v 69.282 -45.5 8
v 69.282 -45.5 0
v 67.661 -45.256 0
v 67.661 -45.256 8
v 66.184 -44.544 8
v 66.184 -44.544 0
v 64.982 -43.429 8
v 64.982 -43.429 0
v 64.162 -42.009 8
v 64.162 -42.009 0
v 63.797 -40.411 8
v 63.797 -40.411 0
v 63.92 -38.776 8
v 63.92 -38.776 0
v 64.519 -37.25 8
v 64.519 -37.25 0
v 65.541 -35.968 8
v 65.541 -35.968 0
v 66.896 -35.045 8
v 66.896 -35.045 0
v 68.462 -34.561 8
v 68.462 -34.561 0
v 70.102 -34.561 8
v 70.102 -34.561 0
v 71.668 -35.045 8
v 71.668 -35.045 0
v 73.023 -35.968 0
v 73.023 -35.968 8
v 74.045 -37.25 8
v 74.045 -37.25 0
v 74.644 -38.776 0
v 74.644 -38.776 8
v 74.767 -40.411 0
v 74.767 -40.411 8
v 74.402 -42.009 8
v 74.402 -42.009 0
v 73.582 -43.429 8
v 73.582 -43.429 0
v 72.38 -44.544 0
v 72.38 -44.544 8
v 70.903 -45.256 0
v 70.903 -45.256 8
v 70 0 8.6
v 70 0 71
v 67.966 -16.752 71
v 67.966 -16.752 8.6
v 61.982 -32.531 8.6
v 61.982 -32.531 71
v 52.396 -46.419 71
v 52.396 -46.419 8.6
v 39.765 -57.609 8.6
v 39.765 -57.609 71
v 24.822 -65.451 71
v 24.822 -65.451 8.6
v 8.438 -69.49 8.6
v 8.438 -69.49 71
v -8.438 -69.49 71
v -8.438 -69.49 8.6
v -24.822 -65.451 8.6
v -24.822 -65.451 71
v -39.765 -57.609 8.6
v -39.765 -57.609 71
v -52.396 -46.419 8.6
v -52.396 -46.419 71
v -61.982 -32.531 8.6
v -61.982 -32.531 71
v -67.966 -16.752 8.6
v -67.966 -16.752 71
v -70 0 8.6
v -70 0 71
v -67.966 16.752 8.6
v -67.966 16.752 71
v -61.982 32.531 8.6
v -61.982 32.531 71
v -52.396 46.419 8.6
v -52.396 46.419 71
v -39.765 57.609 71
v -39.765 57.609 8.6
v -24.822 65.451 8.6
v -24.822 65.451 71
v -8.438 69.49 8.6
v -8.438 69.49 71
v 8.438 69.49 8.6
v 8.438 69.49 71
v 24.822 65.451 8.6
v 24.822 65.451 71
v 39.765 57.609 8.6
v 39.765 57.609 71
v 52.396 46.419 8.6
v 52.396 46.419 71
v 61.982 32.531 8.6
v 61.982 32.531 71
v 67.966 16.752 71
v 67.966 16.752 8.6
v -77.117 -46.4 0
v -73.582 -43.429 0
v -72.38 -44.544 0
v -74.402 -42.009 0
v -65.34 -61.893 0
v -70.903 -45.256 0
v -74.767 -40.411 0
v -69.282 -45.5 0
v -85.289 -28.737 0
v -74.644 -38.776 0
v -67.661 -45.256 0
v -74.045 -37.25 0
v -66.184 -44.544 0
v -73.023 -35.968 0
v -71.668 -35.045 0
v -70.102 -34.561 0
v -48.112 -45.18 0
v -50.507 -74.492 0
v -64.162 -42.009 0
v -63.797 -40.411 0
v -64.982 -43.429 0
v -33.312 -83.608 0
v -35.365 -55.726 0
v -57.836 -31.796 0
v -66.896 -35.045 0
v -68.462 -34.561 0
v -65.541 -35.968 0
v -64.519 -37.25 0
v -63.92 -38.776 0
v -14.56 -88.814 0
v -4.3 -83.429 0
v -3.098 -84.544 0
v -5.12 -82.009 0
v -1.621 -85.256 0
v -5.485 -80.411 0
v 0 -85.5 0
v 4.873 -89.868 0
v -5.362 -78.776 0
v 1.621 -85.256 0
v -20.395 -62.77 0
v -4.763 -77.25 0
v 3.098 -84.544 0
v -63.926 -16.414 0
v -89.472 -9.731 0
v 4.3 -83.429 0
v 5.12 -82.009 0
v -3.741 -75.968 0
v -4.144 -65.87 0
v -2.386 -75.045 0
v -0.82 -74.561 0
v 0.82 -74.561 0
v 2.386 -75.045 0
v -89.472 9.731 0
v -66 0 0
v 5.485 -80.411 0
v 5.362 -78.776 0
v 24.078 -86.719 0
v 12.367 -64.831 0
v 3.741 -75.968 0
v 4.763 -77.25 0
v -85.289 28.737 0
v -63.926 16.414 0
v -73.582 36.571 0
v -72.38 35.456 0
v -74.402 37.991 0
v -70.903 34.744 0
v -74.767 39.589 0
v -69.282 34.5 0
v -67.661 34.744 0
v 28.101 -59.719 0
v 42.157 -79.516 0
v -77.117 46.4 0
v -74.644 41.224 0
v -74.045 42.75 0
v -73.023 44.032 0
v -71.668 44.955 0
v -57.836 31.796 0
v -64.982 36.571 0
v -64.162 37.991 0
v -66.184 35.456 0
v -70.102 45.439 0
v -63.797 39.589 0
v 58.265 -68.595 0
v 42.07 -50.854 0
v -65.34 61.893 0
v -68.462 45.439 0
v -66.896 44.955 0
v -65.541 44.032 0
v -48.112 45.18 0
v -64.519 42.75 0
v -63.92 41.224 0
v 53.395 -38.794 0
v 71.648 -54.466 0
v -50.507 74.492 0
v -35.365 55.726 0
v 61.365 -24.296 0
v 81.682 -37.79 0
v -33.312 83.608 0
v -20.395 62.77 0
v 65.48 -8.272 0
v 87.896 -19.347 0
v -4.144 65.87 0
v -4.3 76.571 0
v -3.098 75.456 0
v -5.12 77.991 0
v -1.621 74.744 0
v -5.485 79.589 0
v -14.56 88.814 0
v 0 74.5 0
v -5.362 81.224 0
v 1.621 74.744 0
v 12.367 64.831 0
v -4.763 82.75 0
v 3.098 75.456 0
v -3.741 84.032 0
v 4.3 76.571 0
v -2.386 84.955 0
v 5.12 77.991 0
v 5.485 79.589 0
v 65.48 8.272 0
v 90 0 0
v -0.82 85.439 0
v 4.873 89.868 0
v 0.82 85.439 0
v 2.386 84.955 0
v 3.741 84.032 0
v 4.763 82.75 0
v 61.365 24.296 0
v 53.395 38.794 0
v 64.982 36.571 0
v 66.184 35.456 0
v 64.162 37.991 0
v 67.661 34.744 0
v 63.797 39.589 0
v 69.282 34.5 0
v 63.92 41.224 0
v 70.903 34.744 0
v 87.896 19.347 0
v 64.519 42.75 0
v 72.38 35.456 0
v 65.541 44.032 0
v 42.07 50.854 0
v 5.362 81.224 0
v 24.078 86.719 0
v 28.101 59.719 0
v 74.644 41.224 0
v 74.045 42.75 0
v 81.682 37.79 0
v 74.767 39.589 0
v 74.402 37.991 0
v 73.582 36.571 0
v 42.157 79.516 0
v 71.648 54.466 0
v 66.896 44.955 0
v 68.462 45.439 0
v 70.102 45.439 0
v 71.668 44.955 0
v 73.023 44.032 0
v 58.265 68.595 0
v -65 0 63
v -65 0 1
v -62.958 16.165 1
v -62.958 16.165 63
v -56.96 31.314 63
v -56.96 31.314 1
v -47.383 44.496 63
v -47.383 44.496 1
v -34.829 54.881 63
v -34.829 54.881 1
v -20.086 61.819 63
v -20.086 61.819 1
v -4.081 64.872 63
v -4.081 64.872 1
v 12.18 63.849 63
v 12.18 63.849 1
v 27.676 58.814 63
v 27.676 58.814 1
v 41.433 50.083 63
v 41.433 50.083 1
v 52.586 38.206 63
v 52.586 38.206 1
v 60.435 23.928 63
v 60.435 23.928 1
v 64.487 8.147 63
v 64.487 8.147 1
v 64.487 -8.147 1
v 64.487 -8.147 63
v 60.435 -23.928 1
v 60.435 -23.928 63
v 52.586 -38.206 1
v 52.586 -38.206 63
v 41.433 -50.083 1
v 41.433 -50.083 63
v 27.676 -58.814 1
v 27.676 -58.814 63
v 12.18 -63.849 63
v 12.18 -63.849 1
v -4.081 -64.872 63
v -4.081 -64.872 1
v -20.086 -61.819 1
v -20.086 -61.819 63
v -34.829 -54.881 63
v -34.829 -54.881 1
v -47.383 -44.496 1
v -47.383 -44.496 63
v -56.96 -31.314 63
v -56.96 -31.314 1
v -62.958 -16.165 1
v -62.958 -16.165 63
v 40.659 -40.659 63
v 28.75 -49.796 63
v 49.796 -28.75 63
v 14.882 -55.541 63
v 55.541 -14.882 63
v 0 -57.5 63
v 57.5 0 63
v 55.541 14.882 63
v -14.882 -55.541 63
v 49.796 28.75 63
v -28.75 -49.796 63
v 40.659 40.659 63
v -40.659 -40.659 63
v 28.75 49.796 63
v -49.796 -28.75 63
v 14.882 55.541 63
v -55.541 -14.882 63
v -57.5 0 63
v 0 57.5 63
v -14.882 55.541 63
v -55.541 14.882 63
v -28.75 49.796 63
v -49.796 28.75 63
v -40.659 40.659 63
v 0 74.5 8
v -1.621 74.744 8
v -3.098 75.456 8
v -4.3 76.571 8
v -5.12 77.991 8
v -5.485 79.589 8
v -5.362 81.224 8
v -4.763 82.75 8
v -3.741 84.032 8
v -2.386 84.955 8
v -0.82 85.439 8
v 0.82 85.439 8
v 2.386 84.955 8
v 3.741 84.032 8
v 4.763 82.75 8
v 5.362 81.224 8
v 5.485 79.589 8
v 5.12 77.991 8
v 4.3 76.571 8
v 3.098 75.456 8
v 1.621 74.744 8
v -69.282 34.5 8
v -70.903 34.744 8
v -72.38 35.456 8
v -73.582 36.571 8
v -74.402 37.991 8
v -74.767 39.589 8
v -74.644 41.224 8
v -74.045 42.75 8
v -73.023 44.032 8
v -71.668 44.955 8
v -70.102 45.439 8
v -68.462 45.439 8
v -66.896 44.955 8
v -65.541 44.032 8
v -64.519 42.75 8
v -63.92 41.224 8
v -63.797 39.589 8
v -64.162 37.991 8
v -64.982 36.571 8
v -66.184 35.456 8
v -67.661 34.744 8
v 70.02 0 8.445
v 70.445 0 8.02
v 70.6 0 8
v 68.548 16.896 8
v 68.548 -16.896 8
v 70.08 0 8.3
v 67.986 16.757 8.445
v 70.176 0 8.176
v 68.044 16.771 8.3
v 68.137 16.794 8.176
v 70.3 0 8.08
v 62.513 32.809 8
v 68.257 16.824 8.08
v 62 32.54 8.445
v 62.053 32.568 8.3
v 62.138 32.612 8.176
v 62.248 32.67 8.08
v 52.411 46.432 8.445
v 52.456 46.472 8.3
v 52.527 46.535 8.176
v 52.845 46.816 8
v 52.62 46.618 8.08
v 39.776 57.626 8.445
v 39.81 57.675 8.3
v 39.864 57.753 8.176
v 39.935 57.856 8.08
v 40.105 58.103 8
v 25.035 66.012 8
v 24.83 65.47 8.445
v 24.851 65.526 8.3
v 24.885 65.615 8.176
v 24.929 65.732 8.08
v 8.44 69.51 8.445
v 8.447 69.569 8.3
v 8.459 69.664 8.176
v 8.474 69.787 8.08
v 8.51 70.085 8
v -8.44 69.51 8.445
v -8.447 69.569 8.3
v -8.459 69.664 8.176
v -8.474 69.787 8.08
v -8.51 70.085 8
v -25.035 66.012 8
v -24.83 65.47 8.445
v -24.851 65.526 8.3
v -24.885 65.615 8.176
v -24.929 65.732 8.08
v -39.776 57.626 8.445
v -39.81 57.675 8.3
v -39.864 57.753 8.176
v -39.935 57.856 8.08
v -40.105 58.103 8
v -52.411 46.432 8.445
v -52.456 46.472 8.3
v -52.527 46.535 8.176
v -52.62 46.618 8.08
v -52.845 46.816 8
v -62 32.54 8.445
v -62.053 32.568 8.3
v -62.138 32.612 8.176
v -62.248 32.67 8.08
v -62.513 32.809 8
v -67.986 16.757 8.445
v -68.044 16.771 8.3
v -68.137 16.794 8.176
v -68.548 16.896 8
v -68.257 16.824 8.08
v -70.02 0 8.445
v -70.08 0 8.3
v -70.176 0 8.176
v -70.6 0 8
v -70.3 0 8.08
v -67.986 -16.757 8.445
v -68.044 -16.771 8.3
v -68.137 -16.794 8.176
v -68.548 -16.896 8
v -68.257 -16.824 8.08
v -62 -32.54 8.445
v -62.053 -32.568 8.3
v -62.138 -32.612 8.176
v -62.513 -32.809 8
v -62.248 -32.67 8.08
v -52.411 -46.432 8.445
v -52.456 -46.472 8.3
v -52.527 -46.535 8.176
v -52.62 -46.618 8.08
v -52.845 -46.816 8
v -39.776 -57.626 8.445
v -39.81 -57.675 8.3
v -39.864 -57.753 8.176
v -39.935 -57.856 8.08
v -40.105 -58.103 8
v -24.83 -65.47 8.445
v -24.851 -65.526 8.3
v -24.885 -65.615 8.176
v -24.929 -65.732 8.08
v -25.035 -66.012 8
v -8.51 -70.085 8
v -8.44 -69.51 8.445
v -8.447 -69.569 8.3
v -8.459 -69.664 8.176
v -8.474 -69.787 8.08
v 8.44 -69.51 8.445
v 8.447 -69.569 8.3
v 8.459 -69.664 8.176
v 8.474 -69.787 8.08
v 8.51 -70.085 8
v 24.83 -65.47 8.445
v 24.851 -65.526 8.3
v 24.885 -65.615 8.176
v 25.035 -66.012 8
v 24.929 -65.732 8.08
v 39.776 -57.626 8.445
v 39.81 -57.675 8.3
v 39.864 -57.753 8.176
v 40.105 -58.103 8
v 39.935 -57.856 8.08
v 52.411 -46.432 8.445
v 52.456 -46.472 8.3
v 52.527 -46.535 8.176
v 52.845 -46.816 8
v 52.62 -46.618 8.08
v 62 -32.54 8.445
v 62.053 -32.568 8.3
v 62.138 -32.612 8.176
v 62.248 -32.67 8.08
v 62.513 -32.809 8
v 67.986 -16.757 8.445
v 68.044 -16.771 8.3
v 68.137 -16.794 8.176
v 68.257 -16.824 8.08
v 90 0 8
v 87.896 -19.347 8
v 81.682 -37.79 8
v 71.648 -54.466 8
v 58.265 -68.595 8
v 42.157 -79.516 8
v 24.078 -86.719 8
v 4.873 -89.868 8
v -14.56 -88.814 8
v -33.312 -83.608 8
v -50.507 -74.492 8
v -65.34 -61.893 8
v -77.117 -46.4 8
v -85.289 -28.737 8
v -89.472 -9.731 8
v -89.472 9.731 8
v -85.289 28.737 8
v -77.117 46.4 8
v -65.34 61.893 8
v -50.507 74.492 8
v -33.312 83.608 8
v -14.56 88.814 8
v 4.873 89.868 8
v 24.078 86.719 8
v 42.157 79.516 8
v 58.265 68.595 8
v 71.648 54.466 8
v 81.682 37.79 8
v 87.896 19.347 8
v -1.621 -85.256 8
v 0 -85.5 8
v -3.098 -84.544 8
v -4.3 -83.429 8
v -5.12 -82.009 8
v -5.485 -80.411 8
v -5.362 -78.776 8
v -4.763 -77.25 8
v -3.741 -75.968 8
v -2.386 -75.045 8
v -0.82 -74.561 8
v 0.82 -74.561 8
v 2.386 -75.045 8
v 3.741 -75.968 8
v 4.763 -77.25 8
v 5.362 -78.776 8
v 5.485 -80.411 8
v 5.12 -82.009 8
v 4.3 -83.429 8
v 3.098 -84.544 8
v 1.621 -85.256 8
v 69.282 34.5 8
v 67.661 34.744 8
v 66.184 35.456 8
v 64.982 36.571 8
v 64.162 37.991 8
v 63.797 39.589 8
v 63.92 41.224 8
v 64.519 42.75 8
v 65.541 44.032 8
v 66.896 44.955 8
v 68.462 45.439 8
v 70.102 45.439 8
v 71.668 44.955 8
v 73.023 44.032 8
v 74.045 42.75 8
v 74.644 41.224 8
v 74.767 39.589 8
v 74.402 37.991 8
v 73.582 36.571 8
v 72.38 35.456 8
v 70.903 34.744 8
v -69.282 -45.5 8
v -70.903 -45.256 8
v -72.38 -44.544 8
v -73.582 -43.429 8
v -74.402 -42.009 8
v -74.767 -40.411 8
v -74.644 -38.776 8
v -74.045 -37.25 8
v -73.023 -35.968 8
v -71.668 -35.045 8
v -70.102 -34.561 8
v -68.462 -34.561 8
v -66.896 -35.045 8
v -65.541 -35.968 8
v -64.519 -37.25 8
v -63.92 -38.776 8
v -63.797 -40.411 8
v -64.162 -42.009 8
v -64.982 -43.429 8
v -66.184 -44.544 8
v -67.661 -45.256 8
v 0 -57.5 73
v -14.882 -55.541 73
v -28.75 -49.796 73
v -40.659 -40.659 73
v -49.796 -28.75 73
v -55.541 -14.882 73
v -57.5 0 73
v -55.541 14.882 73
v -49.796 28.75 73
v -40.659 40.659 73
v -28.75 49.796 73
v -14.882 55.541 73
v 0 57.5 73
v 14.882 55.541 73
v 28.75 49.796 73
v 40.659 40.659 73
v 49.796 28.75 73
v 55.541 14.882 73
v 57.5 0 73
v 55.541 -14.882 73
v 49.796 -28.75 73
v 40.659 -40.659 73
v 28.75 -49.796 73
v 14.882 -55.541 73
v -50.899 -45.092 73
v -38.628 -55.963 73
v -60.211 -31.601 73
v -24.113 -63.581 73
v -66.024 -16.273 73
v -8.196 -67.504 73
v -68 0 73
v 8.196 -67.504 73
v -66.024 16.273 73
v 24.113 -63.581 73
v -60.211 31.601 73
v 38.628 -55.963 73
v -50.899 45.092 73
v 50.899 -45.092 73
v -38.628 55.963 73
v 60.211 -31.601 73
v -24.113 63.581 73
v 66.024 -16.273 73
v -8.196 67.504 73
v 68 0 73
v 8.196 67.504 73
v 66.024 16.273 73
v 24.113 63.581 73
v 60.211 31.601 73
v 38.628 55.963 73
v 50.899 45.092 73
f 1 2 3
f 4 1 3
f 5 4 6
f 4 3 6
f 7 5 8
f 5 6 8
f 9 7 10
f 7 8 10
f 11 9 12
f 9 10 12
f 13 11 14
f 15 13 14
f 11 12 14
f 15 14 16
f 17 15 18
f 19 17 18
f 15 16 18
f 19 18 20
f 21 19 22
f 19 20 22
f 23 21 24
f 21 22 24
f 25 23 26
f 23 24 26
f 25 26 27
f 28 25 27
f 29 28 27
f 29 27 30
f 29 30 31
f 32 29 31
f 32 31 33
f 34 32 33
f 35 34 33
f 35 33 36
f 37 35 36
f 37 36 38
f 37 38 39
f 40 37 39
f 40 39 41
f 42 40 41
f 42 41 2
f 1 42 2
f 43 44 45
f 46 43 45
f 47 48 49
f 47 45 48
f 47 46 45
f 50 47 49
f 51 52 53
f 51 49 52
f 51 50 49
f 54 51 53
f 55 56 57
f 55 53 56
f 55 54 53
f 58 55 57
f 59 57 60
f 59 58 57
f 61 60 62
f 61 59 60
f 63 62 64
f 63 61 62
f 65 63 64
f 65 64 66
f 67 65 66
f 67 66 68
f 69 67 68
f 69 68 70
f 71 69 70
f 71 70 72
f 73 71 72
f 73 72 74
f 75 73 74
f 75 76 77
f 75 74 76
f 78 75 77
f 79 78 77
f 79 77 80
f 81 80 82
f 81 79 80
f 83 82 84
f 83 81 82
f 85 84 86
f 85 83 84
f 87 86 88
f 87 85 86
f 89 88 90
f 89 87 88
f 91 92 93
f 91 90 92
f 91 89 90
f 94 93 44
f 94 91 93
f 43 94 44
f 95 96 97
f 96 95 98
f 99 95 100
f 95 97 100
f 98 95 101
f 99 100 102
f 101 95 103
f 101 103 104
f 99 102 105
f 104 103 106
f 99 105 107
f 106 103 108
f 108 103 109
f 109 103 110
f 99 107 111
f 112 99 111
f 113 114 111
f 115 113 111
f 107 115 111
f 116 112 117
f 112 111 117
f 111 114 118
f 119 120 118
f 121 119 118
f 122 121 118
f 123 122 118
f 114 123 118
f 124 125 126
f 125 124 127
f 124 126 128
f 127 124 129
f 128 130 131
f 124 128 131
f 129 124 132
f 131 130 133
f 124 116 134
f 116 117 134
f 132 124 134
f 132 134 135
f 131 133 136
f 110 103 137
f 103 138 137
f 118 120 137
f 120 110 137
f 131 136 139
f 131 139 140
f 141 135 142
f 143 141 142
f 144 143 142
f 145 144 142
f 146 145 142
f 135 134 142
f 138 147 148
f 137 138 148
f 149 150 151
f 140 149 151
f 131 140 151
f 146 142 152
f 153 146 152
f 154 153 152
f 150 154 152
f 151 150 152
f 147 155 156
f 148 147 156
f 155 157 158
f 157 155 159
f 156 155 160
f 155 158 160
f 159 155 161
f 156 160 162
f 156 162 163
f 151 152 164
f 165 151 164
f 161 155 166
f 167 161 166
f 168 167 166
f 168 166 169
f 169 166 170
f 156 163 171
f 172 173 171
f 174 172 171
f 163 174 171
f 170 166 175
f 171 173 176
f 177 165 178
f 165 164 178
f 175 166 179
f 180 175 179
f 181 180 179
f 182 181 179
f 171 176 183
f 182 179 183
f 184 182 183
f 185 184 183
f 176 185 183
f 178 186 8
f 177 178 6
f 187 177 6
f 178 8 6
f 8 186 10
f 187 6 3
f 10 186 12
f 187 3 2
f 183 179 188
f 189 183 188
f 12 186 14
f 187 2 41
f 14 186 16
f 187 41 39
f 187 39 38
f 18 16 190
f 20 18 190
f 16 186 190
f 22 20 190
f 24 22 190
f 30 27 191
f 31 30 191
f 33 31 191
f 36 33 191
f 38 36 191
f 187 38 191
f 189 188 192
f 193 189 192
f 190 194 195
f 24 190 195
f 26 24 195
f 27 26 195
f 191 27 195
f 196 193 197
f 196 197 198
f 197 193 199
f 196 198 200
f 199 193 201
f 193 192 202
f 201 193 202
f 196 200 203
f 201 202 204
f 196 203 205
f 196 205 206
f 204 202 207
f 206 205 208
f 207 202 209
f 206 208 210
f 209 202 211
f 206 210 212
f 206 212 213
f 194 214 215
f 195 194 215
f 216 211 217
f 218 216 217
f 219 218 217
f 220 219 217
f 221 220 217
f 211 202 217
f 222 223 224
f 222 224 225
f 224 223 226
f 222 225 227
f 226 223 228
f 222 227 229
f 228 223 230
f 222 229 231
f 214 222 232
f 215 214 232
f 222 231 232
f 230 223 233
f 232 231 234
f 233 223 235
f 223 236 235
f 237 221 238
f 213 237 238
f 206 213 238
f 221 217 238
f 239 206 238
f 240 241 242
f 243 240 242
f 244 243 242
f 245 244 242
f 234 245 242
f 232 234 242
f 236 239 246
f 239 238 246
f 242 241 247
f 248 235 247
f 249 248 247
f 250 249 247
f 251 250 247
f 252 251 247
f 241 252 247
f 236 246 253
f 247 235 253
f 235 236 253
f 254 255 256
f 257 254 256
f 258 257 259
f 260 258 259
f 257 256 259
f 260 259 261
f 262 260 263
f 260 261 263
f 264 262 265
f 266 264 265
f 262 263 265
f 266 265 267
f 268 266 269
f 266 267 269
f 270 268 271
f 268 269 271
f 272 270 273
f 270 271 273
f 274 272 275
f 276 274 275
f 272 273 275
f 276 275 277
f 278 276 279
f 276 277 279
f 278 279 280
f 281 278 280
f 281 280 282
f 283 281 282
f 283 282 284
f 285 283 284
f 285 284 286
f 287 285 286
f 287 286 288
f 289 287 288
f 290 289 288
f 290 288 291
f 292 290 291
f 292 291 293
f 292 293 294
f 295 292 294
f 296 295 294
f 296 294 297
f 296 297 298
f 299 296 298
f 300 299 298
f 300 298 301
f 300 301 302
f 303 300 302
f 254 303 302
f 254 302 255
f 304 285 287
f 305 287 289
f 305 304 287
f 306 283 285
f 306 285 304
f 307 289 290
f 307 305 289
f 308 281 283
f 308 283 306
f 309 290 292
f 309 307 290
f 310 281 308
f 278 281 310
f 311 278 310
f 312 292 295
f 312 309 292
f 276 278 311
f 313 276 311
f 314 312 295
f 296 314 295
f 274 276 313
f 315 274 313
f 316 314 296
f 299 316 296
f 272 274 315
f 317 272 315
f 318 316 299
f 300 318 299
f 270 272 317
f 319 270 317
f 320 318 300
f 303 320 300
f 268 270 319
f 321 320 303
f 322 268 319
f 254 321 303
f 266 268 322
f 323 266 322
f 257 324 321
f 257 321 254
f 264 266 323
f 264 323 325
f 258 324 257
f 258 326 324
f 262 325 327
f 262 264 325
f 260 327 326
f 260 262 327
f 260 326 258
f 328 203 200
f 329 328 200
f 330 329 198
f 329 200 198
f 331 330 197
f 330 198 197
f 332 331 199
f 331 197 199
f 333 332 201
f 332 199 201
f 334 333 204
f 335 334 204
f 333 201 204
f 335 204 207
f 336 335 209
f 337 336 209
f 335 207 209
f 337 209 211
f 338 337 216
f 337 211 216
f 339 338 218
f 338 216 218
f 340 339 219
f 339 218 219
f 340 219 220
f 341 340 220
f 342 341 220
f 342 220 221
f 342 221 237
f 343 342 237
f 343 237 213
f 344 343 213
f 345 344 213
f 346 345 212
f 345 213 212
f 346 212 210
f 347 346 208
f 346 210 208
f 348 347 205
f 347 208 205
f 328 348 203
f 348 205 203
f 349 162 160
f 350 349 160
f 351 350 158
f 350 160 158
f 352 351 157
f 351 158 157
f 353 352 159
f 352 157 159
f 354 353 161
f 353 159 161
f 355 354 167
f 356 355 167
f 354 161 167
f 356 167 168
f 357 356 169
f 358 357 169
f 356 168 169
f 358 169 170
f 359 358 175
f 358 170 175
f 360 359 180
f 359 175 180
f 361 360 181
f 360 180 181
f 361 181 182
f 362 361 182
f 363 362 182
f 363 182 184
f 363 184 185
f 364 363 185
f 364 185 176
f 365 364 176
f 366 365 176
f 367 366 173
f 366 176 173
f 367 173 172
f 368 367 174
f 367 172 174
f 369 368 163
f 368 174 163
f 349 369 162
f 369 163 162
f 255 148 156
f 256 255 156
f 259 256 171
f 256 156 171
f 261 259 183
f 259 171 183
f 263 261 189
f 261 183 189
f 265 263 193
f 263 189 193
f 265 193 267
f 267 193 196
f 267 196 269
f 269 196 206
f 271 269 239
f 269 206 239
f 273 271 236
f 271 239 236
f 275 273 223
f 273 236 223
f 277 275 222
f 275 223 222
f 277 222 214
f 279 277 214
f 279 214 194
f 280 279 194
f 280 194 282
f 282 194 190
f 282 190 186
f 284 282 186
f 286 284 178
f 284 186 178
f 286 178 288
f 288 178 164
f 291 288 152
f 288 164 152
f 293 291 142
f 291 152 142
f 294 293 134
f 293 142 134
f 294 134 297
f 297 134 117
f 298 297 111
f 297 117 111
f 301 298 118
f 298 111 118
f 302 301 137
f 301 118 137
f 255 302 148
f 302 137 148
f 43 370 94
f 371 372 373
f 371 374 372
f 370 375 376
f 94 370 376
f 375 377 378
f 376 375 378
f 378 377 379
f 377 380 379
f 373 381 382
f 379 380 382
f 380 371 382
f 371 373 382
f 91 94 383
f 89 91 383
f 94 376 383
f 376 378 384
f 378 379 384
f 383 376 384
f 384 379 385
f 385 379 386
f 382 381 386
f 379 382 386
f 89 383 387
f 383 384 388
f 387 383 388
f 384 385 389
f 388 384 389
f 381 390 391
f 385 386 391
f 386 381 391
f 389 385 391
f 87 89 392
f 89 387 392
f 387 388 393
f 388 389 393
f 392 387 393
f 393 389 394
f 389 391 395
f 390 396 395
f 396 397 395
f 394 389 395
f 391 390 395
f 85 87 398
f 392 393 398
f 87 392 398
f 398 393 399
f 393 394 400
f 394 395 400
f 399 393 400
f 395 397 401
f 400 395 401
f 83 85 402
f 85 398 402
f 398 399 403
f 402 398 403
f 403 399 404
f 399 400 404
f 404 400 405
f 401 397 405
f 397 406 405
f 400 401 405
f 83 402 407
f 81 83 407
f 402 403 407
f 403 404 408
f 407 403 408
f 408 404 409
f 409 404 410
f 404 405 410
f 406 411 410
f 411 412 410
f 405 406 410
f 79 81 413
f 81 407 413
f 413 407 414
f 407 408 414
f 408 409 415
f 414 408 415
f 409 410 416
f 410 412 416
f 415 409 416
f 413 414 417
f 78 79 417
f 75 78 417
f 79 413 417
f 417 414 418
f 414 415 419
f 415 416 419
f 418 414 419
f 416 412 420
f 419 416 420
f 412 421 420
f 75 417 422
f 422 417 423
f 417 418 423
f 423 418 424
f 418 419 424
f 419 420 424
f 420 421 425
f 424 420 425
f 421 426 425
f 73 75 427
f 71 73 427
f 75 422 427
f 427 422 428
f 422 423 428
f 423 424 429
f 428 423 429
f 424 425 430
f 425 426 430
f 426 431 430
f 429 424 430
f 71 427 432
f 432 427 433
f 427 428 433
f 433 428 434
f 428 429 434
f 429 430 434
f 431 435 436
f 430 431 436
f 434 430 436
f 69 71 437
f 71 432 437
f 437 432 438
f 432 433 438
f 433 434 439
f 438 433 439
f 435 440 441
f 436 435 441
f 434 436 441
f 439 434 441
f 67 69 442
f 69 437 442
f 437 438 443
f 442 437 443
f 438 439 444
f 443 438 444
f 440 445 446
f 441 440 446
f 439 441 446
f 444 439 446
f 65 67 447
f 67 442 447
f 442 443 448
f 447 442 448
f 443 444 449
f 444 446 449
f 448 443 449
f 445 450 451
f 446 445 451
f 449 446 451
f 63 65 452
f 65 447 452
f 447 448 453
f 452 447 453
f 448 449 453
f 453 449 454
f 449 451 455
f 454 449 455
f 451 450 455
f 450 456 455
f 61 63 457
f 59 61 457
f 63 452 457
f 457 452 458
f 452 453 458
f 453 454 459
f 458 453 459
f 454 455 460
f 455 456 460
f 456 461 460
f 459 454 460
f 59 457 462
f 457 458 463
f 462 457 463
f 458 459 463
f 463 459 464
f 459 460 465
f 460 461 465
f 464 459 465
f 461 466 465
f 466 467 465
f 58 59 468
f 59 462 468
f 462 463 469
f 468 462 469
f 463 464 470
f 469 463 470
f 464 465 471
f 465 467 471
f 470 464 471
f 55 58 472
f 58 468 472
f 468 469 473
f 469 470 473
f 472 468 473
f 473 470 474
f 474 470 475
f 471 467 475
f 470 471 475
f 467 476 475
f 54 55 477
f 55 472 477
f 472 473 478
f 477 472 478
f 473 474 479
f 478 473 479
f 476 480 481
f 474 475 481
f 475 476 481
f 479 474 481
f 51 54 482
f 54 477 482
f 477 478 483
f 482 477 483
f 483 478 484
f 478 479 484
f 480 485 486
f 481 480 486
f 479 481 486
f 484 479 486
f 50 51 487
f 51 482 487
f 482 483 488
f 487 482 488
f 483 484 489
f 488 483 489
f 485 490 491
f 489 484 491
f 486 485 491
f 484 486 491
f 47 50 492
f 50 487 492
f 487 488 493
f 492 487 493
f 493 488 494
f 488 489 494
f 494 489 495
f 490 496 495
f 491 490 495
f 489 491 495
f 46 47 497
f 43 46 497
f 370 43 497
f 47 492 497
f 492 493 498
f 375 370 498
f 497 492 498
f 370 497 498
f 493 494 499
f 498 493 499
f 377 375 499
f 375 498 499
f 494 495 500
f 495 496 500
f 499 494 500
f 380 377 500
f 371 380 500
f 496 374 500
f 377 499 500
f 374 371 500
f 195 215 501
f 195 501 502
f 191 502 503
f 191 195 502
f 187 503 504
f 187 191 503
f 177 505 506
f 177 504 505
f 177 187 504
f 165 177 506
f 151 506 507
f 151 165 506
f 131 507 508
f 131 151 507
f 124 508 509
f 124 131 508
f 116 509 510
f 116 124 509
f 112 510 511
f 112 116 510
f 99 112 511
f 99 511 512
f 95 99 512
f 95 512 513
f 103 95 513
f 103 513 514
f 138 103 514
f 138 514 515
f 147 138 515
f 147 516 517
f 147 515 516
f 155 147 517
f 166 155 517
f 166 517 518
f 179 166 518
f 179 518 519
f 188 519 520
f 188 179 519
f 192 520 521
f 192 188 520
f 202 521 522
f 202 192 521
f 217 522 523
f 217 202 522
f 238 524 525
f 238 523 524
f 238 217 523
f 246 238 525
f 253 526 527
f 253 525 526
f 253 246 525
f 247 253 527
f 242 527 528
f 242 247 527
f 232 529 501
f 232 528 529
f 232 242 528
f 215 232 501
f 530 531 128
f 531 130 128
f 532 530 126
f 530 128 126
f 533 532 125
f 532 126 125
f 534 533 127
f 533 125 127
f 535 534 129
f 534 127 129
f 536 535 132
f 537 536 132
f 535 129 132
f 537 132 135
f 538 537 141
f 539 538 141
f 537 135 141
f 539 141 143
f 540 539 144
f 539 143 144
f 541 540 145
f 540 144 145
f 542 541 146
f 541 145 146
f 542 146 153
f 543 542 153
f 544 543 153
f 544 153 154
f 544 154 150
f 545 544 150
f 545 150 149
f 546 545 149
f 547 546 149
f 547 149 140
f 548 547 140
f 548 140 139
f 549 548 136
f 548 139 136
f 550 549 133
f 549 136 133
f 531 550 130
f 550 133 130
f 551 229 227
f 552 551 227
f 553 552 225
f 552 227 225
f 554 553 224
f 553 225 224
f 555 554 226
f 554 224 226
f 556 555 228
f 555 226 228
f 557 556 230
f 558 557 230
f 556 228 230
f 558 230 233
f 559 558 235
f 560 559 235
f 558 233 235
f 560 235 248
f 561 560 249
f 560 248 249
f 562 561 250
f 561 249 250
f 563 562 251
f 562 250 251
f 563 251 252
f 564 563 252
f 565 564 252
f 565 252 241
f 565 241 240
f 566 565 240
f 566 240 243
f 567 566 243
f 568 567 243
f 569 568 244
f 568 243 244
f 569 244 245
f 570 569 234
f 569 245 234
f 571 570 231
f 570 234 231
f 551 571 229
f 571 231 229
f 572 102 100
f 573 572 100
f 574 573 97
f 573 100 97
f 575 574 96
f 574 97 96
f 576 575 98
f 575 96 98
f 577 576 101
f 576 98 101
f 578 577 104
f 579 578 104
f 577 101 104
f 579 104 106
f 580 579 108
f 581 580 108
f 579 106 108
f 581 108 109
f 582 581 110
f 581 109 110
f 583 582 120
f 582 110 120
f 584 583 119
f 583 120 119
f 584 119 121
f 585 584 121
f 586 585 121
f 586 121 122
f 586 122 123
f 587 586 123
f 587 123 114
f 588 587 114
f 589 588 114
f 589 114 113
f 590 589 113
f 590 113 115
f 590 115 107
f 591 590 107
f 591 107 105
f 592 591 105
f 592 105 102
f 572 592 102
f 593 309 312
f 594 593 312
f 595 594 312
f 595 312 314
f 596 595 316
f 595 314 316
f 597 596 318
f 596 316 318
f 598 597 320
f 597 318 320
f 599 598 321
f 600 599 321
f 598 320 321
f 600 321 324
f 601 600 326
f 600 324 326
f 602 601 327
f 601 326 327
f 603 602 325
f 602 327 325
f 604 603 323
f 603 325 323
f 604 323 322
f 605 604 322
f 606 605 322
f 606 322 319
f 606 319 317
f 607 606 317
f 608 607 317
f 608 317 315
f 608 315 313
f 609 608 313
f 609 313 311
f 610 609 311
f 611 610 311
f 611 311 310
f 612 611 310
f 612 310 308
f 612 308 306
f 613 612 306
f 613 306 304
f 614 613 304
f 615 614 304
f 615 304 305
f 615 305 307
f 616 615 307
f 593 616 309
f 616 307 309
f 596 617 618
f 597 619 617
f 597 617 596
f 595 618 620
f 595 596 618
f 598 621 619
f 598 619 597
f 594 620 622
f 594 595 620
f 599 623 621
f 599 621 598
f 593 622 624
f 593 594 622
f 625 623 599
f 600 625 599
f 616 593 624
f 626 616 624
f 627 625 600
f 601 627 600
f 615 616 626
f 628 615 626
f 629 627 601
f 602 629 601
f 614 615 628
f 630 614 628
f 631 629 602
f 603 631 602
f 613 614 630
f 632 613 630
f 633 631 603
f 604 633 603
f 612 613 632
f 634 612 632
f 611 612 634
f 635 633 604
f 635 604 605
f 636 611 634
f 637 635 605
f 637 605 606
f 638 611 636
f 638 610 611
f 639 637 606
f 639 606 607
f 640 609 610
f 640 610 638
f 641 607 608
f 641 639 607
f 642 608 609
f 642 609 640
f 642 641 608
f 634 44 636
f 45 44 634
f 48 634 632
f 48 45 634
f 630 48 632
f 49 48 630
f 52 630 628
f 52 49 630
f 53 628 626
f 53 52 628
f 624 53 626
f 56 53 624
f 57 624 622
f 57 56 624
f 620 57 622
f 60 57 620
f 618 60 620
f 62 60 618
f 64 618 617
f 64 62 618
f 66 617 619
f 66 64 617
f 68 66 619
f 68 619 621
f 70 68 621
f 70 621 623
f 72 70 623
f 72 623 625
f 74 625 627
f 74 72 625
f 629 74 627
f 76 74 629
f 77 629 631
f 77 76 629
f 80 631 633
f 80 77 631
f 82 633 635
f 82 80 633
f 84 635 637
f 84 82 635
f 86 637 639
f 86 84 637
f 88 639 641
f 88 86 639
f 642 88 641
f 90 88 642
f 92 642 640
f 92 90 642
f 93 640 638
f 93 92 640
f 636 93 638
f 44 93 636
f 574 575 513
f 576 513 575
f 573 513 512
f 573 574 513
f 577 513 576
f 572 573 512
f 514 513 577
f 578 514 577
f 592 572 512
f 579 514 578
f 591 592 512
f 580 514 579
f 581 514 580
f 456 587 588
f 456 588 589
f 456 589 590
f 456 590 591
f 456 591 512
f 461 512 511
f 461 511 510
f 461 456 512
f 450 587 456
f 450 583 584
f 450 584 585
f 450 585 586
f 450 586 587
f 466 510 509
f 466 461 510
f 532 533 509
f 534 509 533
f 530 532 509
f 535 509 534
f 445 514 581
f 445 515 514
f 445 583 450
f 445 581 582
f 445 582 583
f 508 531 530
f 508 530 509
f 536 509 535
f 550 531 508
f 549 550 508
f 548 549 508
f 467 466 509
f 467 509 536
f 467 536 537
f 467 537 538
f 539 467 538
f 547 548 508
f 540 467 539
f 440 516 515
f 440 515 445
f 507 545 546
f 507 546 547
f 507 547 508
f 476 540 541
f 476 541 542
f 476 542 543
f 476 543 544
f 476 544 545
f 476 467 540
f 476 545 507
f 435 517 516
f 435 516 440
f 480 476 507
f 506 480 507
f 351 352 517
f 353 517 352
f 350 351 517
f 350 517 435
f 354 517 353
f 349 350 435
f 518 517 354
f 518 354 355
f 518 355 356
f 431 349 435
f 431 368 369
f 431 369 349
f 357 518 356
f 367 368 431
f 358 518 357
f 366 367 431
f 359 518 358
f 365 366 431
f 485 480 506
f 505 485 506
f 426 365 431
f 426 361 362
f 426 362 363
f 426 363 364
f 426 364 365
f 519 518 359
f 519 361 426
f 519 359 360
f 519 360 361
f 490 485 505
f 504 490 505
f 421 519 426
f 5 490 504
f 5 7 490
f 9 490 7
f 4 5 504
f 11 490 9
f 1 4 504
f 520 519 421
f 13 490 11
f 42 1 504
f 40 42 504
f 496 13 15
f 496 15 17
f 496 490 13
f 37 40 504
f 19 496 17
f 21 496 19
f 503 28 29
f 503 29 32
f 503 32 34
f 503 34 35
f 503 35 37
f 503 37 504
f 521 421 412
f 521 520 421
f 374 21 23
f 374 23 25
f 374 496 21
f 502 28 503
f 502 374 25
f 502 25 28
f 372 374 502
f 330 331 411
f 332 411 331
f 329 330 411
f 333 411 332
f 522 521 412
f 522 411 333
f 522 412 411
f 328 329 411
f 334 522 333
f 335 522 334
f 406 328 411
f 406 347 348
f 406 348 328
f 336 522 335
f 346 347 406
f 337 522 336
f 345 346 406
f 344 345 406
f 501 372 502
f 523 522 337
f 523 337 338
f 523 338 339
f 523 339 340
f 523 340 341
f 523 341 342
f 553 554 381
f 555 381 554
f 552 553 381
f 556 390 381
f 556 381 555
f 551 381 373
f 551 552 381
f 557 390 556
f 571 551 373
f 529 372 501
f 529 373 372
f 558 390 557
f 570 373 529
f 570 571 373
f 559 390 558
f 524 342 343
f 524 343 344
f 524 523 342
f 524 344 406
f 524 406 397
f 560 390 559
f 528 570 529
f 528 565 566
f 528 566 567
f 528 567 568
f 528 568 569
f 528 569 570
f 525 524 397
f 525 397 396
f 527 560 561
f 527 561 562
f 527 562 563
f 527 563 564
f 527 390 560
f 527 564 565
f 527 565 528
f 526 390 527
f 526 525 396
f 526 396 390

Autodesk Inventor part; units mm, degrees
ref_plane "YZ Plane" through (0, 0, 0) normal (1, 0, 0) x (0, 1, 0)
ref_plane "XZ Plane" through (0, 0, 0) normal (0, 1, 0) x (-1, 0, 0)
ref_plane "XY Plane" through (0, 0, 0) normal (0, 0, 1) x (1, 0, 0)
sketch "Эскиз1" plane through (0, 0, 0) normal (0, 0, 1) x (1, 0, 0)
  circle A0 centre (0, 0) radius 90
  dimension "d0" = 180
extrude "Выдавливание1" add sketch "Эскиз1" along normal blind 8
sketch "Эскиз2" plane through (0, 0, 8) normal (0, 0, 1) x (1, 0, 0)
  point P0 (0, 0)
sketch "Эскиз3" plane through (0, 0, 8) normal (0, 0, 1) x (1, 0, 0)
  circle A0 centre (0, 0) radius 70
  dimension "d4" = 140
extrude "Выдавливание2" add sketch "Эскиз3" along normal blind 65
sketch "Эскиз4" plane through (0, 0, 0) normal (0, 0, -1) x (-1, 0, 0)
  circle A0 centre (0, 0) radius 65
  dimension "d7" = 130
extrude "Выдавливание3" cut sketch "Эскиз4" against normal blind 63
chamfer "Фаска1" distance 1 angle 45 1 edges at (65, 0, 0)
chamfer "Фаска2" distance 2 angle 45 1 edges at (-70, 0, 73)
sketch "Эскиз5" plane through (0, 0, 8) normal (0, 0, 1) x (1, 0, 0)
  line L0 (0, 0) -> (0, 90)
  circle A0 centre (0, 0) radius 90 projected
  line L1 (0, 0) -> (-77.9423, 45)
  line L2 (0, 0) -> (-77.9423, -45)
  line L3 (0, 0) -> (0, -90)
  line L4 (0, 0) -> (77.9423, -45)
  line L5 (0, 0) -> (77.9423, 45)
  dimension "d18" = 360
sketch "Эскиз6" plane through (0, 0, 8) normal (0, 0, 1) x (1, 0, 0)
  point P0 (0, 0)
sketch "Эскиз7" plane through (0, 0, 8) normal (0, 0, 1) x (1, 0, 0)
  point P0 (0, 0)
sketch "Эскиз8" plane through (0, 0, 8) normal (0, 0, 1) x (1, 0, 0)
  point P0 (0, 0)
sketch "Эскиз9" plane through (0, 0, 73) normal (0, 0, 1) x (1, 0, 0)
  point P0 (0, 0)
sketch "Эскиз10" plane through (0, 0, 73) normal (0, 0, 1) x (1, 0, 0)
  circle A0 centre (0, 0) radius 57.5
  dimension "d20" = 115
sketch "Эскиз11" plane through (0, 0, 63) normal (0, 0, -1) x (-1, 0, 0)
  circle A0 centre (0, 0) radius 57.5
  dimension "d21" = 115
hole "Отверстие1" at (0, 0, 73) direction (0, 0, -1) diameter 115 end through all
sketch "Эскиз12" plane through (0, 0, 8) normal (0, 0, 1) x (1, 0, 0)
  circle A0 centre (0, 0) radius 80
  circle A1 centre (0, 0) radius 70 projected
  point P0 (0, 80)
  point P1 (-69.282, 40)
  point P2 (-69.282, -40)
  point P3 (0, -80)
  point P4 (69.282, -40)
  point P5 (69.282, 40)
  dimension "d29" = 160
  dimension "d32" = 360
hole "Отверстие2" at (0, 80, 8) at (69.282, 40, 8) at (69.282, -40, 8) at (0, -80, 8) at (-69.282, -40, 8) at (-69.282, 40, 8) direction (0, 0, -1) diameter 11 end through all
fillet "Сопряжение1" radius 0.6 1 edges at (-70, 0, 8)
